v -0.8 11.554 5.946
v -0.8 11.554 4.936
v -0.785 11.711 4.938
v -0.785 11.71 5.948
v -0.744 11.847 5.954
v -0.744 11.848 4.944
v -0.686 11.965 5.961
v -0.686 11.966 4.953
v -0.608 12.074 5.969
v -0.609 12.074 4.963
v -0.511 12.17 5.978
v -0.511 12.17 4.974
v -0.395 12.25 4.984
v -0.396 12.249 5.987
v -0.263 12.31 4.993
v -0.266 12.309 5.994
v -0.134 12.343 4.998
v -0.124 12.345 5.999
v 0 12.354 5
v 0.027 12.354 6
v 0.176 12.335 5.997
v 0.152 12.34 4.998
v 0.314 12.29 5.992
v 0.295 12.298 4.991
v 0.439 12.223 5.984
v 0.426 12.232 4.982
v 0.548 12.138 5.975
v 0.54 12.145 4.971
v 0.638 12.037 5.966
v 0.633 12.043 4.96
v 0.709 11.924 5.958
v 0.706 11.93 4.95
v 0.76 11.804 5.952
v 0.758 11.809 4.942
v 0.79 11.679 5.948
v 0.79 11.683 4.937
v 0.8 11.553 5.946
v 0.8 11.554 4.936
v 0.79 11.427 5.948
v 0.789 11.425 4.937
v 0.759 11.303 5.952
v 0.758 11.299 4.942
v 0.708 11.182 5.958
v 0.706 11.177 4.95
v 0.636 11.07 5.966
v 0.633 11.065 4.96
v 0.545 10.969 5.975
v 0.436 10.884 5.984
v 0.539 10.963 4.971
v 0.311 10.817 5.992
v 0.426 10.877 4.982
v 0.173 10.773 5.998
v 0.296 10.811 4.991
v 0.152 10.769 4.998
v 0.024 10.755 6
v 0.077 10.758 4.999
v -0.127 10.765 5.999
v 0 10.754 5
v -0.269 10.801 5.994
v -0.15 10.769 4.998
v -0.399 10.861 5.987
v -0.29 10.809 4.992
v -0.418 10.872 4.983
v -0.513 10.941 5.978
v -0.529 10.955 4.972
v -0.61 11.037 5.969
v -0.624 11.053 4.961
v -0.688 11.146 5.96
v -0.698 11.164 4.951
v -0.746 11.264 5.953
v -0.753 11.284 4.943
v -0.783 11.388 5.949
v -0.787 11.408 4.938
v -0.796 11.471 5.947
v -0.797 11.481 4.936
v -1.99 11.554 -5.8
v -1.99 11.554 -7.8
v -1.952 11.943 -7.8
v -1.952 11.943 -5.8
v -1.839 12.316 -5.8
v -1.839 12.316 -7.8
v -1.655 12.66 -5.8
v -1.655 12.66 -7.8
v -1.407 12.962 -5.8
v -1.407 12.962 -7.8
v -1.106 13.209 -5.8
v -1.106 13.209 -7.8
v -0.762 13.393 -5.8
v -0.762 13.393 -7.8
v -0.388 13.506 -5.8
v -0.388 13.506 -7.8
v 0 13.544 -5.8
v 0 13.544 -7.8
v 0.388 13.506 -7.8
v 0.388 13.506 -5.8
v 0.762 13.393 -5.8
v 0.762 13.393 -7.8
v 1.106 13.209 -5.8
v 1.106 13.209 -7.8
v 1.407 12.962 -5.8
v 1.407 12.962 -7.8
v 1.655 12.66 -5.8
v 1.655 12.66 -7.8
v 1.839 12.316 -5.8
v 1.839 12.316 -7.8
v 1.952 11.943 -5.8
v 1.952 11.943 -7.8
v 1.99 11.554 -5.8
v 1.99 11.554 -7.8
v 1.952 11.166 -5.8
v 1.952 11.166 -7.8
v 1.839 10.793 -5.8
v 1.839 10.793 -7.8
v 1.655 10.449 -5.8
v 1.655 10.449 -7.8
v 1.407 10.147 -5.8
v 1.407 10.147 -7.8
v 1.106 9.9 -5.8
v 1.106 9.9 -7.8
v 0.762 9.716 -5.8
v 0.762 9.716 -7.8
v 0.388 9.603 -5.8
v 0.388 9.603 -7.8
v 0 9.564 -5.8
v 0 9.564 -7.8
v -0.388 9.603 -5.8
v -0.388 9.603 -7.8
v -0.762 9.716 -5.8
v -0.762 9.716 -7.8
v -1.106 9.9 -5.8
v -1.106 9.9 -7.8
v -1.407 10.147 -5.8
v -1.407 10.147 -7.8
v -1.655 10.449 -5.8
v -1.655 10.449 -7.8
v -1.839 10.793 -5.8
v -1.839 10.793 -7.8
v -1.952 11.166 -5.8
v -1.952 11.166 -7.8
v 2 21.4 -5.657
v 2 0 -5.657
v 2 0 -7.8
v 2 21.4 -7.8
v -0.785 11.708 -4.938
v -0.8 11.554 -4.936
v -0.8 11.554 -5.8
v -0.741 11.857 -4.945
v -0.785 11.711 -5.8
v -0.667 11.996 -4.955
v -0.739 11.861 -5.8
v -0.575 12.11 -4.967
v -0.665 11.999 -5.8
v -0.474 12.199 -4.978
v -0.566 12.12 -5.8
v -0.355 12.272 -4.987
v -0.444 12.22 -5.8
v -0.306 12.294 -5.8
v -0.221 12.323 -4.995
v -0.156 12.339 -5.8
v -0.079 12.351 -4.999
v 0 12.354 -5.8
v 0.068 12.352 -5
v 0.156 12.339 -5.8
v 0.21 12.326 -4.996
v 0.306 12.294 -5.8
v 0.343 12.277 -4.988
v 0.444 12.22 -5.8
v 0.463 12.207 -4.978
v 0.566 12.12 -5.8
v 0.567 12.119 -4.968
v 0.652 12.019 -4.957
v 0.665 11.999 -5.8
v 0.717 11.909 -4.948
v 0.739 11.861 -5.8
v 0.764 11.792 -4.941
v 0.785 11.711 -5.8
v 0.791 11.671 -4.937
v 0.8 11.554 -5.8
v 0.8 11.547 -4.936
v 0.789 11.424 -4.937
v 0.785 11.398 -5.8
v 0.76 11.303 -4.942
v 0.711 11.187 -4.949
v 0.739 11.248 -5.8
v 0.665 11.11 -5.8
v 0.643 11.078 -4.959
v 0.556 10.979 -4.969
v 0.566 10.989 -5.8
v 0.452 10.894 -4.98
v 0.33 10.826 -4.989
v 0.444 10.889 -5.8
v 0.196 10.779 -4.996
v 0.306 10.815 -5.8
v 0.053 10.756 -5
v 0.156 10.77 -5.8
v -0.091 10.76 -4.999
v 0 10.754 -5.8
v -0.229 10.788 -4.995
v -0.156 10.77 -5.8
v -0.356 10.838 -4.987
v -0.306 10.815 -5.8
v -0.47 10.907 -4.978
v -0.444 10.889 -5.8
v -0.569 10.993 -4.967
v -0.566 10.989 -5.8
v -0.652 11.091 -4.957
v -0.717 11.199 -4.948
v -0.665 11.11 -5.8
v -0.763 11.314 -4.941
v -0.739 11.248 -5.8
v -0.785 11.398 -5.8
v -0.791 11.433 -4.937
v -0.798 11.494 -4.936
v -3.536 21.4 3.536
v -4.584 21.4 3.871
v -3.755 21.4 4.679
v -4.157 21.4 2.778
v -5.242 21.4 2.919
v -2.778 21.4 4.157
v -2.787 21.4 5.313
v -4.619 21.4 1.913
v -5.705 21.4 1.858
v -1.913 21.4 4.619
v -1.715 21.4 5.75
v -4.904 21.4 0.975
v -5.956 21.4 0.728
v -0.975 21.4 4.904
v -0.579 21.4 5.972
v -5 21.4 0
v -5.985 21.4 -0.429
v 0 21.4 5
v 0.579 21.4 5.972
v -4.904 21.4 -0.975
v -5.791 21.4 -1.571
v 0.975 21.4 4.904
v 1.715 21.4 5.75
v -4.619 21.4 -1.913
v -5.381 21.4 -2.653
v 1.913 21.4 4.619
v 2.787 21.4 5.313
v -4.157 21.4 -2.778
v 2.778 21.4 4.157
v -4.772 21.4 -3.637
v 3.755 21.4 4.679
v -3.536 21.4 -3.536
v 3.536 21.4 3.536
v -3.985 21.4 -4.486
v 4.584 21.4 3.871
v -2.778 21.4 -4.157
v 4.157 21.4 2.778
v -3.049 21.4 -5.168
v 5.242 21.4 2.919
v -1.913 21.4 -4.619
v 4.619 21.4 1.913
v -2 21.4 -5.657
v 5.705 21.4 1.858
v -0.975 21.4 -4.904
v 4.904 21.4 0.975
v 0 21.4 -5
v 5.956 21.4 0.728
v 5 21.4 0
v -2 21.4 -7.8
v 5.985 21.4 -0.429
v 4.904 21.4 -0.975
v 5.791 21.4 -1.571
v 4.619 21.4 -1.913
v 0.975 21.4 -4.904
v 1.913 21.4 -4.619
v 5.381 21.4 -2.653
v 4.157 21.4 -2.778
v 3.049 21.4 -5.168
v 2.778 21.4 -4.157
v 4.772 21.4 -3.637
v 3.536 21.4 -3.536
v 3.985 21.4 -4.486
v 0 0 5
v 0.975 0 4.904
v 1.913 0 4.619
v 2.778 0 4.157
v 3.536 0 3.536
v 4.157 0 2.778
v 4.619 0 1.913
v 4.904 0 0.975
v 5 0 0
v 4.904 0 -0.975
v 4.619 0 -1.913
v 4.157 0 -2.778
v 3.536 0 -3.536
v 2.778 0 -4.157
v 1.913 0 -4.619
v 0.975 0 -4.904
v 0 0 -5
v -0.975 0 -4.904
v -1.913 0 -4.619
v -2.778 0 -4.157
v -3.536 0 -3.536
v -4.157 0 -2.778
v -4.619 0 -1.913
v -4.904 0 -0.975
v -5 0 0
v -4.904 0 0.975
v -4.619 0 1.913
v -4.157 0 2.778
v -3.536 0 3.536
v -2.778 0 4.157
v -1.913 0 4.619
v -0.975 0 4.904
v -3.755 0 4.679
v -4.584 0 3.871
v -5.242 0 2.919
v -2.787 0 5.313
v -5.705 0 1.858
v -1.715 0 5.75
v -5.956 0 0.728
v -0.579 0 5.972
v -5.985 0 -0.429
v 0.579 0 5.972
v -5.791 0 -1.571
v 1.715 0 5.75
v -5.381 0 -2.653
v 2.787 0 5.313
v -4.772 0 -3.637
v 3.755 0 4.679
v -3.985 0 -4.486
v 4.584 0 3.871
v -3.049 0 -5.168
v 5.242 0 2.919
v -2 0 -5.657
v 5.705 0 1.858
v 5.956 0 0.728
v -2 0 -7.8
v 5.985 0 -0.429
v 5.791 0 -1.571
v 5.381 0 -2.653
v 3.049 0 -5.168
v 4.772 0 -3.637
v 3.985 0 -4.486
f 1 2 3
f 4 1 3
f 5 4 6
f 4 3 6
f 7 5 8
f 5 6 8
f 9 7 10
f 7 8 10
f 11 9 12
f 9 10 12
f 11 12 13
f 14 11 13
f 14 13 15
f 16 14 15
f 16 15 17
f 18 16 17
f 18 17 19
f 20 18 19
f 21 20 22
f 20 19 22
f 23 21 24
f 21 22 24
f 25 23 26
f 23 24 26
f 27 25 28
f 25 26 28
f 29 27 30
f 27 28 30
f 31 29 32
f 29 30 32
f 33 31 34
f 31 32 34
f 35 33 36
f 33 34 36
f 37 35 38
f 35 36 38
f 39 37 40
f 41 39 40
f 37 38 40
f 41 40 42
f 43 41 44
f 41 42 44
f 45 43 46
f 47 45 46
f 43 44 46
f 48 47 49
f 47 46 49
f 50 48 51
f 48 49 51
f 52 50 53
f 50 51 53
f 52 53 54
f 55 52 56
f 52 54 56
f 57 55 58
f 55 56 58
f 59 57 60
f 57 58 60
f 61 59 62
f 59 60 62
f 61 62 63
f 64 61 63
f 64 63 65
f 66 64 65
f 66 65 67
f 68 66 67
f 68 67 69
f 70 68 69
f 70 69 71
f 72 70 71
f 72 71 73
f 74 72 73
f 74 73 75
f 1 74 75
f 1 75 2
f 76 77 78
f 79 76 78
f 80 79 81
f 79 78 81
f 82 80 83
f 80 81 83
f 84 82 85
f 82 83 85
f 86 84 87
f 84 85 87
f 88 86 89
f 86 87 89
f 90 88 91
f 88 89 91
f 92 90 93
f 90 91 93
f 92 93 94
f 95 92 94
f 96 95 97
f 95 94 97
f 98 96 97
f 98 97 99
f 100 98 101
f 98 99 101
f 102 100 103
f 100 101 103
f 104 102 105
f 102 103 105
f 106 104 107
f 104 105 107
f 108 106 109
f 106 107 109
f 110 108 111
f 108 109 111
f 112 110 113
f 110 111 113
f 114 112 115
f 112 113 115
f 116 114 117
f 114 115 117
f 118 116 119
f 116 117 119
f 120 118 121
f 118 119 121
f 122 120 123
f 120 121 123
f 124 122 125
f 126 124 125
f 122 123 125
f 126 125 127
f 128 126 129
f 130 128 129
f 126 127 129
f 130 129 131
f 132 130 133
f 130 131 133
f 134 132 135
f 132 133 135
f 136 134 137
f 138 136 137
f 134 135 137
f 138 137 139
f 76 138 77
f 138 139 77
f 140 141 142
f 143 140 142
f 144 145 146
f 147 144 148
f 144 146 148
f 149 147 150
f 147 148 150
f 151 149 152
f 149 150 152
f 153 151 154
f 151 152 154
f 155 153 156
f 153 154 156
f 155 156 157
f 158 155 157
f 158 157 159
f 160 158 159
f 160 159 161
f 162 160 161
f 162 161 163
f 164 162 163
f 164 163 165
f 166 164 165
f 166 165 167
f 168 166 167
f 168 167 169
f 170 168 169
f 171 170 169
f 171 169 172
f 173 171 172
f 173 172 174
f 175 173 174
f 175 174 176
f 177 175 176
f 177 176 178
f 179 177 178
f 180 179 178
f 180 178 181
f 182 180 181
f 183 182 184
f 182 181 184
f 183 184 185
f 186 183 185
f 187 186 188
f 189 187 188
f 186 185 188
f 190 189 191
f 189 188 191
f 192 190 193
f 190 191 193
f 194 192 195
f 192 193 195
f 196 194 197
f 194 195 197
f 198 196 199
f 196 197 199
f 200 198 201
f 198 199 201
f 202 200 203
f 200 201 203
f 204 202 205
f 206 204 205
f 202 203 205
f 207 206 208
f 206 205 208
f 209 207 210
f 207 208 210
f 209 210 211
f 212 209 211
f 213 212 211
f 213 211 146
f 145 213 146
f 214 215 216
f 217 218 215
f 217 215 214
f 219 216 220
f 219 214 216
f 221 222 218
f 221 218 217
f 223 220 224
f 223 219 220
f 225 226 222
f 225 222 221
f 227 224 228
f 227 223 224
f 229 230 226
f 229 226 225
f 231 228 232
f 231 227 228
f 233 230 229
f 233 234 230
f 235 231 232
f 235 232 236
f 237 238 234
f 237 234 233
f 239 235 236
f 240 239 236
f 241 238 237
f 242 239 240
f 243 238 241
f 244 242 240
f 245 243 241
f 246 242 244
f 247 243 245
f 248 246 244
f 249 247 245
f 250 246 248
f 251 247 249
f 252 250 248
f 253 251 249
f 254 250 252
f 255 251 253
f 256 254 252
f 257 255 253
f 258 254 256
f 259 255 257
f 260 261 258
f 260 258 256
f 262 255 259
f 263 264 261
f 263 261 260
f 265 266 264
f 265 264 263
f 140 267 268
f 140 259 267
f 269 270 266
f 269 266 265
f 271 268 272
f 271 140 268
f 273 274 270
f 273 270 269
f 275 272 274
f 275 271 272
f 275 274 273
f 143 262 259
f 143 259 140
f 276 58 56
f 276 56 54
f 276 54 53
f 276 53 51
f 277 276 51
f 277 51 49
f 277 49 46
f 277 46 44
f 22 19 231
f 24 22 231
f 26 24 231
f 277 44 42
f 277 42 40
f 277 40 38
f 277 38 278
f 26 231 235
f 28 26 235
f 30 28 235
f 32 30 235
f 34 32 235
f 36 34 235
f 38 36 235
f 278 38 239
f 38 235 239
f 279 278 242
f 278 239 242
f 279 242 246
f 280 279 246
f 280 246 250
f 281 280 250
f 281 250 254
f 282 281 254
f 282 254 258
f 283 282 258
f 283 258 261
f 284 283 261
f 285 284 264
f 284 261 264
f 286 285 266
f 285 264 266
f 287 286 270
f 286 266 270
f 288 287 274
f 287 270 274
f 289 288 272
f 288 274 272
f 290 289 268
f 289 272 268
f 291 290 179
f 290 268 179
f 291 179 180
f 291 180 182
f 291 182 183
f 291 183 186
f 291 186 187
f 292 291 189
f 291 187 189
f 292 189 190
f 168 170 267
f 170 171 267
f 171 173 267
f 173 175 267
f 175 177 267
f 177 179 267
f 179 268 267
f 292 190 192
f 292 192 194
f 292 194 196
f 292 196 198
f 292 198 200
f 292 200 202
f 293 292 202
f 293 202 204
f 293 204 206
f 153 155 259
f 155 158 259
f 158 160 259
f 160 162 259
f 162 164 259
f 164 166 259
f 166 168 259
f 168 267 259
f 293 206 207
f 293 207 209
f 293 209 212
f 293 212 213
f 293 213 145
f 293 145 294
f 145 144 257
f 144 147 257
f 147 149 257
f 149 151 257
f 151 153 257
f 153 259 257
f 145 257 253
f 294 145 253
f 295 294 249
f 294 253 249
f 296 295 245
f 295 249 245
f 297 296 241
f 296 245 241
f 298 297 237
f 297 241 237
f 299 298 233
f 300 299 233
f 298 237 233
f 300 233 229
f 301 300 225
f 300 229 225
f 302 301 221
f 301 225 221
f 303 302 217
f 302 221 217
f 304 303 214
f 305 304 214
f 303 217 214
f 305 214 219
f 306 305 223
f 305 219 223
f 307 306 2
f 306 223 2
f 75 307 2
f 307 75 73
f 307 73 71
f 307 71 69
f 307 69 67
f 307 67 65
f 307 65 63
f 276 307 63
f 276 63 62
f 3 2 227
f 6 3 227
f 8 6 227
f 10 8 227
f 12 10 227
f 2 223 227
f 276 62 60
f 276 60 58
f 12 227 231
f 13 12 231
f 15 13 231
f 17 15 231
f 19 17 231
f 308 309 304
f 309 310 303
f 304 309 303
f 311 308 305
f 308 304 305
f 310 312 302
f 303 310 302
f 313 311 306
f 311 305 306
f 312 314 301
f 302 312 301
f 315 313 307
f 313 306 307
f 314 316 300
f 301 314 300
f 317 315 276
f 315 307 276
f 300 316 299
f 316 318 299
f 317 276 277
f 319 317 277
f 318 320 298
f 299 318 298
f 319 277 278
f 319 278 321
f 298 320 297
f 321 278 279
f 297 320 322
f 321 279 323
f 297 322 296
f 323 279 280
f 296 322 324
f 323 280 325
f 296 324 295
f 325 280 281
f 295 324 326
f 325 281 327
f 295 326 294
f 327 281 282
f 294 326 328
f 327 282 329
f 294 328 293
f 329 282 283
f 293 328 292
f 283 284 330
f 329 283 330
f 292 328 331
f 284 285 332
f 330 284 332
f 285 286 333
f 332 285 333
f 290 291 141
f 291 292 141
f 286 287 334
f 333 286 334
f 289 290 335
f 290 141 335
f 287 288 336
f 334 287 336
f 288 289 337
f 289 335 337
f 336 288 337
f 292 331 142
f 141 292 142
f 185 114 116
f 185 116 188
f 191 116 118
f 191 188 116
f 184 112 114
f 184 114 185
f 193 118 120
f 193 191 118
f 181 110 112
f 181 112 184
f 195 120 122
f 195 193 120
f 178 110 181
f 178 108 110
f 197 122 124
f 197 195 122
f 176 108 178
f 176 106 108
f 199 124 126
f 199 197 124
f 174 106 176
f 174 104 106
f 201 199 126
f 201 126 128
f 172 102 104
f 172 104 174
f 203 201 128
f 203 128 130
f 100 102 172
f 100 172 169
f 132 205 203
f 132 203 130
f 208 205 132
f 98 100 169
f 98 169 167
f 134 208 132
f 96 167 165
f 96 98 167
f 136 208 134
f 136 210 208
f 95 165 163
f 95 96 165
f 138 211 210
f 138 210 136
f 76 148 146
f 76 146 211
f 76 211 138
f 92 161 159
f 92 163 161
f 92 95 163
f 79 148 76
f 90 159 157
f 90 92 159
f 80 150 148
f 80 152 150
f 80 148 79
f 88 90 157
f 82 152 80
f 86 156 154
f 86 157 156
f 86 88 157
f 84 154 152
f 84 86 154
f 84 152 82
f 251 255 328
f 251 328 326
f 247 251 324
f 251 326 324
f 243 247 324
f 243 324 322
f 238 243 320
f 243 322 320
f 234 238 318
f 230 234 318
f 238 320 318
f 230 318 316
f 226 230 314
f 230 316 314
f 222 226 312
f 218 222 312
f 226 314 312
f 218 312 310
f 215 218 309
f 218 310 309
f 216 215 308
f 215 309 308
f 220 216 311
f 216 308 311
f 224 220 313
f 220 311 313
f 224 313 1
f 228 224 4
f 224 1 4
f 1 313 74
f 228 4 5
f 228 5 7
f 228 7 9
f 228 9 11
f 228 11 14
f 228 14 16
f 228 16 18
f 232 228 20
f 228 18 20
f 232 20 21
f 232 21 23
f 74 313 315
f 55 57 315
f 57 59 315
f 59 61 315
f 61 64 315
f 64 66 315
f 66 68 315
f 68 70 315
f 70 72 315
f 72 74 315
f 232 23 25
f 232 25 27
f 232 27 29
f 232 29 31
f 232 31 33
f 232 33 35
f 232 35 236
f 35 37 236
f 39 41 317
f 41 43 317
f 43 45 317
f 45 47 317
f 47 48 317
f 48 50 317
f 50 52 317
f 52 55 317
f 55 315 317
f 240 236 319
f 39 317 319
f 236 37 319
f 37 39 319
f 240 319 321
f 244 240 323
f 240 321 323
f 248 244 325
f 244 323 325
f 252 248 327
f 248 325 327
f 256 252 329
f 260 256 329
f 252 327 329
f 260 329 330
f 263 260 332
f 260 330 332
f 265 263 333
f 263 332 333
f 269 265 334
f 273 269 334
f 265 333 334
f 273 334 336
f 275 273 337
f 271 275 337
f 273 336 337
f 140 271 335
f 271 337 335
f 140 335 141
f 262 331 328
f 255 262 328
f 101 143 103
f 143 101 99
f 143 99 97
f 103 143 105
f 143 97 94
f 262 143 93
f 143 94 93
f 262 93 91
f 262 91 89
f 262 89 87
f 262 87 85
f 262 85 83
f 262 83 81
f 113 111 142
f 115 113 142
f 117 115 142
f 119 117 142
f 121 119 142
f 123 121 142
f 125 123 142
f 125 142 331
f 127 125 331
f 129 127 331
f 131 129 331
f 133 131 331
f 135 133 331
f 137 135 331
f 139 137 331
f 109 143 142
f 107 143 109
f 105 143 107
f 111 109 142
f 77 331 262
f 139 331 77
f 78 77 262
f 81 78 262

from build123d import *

# Parameters (mm, degrees)
BOSS_EXTRUDE1_DEPTH = 21.4
SKETCH3_R           = 5
CUT_EXTRUDE1_DEPTH  = 24.9
SKETCH4_R           = 1.99
CUT_EXTRUDE2_DEPTH  = 2
SKETCH5_R           = 0.8
CUT_EXTRUDE3_DEPTH  = 26.16346558


with BuildPart() as part:
    # Sketch2 → Boss-Extrude1 (new body)
    with BuildSketch(Plane(origin=(0, 0, 0), x_dir=(1, 0, 0), z_dir=(0, 1, 0))):
        with BuildLine():
            Line((0, 7.8), (-2, 7.8))
            Line((-2, 7.8), (-2, 5.656854249))
            ThreePointArc((-2, 5.656854249), (0, -6), (2, 5.656854249))
            Line((2, 5.656854249), (2, 7.8))
            Line((2, 7.8), (0, 7.8))
        make_face()
    extrude(amount=BOSS_EXTRUDE1_DEPTH)

    # Sketch3 → Cut-Extrude1 (cut)
    with BuildSketch(Plane(origin=(0, 21.4, 0), x_dir=(1, 0, 0), z_dir=(0, 1, 0))):
        with Locations(Location((0, 0, 0), (0, 0, 270))):
            Circle(SKETCH3_R)
    extrude(amount=-CUT_EXTRUDE1_DEPTH, mode=Mode.SUBTRACT)

    # Sketch4 → Cut-Extrude2 (cut)
    with BuildSketch(Plane(origin=(0, 0, -7.8), x_dir=(-1, 0, 0), z_dir=(0, 0, -1))):
        with Locations((0, 11.554448974)):
            Circle(SKETCH4_R)
    extrude(amount=-CUT_EXTRUDE2_DEPTH, mode=Mode.SUBTRACT)

    # Sketch5 → Cut-Extrude3 (cut, through all)
    with BuildSketch(Plane(origin=(0, 0, -5.8), x_dir=(-1, 0, 0), z_dir=(0, 0, -1))):
        with Locations((0, 11.554448974)):
            Circle(SKETCH5_R)
    extrude(amount=-CUT_EXTRUDE3_DEPTH, mode=Mode.SUBTRACT)


solid = part.part
